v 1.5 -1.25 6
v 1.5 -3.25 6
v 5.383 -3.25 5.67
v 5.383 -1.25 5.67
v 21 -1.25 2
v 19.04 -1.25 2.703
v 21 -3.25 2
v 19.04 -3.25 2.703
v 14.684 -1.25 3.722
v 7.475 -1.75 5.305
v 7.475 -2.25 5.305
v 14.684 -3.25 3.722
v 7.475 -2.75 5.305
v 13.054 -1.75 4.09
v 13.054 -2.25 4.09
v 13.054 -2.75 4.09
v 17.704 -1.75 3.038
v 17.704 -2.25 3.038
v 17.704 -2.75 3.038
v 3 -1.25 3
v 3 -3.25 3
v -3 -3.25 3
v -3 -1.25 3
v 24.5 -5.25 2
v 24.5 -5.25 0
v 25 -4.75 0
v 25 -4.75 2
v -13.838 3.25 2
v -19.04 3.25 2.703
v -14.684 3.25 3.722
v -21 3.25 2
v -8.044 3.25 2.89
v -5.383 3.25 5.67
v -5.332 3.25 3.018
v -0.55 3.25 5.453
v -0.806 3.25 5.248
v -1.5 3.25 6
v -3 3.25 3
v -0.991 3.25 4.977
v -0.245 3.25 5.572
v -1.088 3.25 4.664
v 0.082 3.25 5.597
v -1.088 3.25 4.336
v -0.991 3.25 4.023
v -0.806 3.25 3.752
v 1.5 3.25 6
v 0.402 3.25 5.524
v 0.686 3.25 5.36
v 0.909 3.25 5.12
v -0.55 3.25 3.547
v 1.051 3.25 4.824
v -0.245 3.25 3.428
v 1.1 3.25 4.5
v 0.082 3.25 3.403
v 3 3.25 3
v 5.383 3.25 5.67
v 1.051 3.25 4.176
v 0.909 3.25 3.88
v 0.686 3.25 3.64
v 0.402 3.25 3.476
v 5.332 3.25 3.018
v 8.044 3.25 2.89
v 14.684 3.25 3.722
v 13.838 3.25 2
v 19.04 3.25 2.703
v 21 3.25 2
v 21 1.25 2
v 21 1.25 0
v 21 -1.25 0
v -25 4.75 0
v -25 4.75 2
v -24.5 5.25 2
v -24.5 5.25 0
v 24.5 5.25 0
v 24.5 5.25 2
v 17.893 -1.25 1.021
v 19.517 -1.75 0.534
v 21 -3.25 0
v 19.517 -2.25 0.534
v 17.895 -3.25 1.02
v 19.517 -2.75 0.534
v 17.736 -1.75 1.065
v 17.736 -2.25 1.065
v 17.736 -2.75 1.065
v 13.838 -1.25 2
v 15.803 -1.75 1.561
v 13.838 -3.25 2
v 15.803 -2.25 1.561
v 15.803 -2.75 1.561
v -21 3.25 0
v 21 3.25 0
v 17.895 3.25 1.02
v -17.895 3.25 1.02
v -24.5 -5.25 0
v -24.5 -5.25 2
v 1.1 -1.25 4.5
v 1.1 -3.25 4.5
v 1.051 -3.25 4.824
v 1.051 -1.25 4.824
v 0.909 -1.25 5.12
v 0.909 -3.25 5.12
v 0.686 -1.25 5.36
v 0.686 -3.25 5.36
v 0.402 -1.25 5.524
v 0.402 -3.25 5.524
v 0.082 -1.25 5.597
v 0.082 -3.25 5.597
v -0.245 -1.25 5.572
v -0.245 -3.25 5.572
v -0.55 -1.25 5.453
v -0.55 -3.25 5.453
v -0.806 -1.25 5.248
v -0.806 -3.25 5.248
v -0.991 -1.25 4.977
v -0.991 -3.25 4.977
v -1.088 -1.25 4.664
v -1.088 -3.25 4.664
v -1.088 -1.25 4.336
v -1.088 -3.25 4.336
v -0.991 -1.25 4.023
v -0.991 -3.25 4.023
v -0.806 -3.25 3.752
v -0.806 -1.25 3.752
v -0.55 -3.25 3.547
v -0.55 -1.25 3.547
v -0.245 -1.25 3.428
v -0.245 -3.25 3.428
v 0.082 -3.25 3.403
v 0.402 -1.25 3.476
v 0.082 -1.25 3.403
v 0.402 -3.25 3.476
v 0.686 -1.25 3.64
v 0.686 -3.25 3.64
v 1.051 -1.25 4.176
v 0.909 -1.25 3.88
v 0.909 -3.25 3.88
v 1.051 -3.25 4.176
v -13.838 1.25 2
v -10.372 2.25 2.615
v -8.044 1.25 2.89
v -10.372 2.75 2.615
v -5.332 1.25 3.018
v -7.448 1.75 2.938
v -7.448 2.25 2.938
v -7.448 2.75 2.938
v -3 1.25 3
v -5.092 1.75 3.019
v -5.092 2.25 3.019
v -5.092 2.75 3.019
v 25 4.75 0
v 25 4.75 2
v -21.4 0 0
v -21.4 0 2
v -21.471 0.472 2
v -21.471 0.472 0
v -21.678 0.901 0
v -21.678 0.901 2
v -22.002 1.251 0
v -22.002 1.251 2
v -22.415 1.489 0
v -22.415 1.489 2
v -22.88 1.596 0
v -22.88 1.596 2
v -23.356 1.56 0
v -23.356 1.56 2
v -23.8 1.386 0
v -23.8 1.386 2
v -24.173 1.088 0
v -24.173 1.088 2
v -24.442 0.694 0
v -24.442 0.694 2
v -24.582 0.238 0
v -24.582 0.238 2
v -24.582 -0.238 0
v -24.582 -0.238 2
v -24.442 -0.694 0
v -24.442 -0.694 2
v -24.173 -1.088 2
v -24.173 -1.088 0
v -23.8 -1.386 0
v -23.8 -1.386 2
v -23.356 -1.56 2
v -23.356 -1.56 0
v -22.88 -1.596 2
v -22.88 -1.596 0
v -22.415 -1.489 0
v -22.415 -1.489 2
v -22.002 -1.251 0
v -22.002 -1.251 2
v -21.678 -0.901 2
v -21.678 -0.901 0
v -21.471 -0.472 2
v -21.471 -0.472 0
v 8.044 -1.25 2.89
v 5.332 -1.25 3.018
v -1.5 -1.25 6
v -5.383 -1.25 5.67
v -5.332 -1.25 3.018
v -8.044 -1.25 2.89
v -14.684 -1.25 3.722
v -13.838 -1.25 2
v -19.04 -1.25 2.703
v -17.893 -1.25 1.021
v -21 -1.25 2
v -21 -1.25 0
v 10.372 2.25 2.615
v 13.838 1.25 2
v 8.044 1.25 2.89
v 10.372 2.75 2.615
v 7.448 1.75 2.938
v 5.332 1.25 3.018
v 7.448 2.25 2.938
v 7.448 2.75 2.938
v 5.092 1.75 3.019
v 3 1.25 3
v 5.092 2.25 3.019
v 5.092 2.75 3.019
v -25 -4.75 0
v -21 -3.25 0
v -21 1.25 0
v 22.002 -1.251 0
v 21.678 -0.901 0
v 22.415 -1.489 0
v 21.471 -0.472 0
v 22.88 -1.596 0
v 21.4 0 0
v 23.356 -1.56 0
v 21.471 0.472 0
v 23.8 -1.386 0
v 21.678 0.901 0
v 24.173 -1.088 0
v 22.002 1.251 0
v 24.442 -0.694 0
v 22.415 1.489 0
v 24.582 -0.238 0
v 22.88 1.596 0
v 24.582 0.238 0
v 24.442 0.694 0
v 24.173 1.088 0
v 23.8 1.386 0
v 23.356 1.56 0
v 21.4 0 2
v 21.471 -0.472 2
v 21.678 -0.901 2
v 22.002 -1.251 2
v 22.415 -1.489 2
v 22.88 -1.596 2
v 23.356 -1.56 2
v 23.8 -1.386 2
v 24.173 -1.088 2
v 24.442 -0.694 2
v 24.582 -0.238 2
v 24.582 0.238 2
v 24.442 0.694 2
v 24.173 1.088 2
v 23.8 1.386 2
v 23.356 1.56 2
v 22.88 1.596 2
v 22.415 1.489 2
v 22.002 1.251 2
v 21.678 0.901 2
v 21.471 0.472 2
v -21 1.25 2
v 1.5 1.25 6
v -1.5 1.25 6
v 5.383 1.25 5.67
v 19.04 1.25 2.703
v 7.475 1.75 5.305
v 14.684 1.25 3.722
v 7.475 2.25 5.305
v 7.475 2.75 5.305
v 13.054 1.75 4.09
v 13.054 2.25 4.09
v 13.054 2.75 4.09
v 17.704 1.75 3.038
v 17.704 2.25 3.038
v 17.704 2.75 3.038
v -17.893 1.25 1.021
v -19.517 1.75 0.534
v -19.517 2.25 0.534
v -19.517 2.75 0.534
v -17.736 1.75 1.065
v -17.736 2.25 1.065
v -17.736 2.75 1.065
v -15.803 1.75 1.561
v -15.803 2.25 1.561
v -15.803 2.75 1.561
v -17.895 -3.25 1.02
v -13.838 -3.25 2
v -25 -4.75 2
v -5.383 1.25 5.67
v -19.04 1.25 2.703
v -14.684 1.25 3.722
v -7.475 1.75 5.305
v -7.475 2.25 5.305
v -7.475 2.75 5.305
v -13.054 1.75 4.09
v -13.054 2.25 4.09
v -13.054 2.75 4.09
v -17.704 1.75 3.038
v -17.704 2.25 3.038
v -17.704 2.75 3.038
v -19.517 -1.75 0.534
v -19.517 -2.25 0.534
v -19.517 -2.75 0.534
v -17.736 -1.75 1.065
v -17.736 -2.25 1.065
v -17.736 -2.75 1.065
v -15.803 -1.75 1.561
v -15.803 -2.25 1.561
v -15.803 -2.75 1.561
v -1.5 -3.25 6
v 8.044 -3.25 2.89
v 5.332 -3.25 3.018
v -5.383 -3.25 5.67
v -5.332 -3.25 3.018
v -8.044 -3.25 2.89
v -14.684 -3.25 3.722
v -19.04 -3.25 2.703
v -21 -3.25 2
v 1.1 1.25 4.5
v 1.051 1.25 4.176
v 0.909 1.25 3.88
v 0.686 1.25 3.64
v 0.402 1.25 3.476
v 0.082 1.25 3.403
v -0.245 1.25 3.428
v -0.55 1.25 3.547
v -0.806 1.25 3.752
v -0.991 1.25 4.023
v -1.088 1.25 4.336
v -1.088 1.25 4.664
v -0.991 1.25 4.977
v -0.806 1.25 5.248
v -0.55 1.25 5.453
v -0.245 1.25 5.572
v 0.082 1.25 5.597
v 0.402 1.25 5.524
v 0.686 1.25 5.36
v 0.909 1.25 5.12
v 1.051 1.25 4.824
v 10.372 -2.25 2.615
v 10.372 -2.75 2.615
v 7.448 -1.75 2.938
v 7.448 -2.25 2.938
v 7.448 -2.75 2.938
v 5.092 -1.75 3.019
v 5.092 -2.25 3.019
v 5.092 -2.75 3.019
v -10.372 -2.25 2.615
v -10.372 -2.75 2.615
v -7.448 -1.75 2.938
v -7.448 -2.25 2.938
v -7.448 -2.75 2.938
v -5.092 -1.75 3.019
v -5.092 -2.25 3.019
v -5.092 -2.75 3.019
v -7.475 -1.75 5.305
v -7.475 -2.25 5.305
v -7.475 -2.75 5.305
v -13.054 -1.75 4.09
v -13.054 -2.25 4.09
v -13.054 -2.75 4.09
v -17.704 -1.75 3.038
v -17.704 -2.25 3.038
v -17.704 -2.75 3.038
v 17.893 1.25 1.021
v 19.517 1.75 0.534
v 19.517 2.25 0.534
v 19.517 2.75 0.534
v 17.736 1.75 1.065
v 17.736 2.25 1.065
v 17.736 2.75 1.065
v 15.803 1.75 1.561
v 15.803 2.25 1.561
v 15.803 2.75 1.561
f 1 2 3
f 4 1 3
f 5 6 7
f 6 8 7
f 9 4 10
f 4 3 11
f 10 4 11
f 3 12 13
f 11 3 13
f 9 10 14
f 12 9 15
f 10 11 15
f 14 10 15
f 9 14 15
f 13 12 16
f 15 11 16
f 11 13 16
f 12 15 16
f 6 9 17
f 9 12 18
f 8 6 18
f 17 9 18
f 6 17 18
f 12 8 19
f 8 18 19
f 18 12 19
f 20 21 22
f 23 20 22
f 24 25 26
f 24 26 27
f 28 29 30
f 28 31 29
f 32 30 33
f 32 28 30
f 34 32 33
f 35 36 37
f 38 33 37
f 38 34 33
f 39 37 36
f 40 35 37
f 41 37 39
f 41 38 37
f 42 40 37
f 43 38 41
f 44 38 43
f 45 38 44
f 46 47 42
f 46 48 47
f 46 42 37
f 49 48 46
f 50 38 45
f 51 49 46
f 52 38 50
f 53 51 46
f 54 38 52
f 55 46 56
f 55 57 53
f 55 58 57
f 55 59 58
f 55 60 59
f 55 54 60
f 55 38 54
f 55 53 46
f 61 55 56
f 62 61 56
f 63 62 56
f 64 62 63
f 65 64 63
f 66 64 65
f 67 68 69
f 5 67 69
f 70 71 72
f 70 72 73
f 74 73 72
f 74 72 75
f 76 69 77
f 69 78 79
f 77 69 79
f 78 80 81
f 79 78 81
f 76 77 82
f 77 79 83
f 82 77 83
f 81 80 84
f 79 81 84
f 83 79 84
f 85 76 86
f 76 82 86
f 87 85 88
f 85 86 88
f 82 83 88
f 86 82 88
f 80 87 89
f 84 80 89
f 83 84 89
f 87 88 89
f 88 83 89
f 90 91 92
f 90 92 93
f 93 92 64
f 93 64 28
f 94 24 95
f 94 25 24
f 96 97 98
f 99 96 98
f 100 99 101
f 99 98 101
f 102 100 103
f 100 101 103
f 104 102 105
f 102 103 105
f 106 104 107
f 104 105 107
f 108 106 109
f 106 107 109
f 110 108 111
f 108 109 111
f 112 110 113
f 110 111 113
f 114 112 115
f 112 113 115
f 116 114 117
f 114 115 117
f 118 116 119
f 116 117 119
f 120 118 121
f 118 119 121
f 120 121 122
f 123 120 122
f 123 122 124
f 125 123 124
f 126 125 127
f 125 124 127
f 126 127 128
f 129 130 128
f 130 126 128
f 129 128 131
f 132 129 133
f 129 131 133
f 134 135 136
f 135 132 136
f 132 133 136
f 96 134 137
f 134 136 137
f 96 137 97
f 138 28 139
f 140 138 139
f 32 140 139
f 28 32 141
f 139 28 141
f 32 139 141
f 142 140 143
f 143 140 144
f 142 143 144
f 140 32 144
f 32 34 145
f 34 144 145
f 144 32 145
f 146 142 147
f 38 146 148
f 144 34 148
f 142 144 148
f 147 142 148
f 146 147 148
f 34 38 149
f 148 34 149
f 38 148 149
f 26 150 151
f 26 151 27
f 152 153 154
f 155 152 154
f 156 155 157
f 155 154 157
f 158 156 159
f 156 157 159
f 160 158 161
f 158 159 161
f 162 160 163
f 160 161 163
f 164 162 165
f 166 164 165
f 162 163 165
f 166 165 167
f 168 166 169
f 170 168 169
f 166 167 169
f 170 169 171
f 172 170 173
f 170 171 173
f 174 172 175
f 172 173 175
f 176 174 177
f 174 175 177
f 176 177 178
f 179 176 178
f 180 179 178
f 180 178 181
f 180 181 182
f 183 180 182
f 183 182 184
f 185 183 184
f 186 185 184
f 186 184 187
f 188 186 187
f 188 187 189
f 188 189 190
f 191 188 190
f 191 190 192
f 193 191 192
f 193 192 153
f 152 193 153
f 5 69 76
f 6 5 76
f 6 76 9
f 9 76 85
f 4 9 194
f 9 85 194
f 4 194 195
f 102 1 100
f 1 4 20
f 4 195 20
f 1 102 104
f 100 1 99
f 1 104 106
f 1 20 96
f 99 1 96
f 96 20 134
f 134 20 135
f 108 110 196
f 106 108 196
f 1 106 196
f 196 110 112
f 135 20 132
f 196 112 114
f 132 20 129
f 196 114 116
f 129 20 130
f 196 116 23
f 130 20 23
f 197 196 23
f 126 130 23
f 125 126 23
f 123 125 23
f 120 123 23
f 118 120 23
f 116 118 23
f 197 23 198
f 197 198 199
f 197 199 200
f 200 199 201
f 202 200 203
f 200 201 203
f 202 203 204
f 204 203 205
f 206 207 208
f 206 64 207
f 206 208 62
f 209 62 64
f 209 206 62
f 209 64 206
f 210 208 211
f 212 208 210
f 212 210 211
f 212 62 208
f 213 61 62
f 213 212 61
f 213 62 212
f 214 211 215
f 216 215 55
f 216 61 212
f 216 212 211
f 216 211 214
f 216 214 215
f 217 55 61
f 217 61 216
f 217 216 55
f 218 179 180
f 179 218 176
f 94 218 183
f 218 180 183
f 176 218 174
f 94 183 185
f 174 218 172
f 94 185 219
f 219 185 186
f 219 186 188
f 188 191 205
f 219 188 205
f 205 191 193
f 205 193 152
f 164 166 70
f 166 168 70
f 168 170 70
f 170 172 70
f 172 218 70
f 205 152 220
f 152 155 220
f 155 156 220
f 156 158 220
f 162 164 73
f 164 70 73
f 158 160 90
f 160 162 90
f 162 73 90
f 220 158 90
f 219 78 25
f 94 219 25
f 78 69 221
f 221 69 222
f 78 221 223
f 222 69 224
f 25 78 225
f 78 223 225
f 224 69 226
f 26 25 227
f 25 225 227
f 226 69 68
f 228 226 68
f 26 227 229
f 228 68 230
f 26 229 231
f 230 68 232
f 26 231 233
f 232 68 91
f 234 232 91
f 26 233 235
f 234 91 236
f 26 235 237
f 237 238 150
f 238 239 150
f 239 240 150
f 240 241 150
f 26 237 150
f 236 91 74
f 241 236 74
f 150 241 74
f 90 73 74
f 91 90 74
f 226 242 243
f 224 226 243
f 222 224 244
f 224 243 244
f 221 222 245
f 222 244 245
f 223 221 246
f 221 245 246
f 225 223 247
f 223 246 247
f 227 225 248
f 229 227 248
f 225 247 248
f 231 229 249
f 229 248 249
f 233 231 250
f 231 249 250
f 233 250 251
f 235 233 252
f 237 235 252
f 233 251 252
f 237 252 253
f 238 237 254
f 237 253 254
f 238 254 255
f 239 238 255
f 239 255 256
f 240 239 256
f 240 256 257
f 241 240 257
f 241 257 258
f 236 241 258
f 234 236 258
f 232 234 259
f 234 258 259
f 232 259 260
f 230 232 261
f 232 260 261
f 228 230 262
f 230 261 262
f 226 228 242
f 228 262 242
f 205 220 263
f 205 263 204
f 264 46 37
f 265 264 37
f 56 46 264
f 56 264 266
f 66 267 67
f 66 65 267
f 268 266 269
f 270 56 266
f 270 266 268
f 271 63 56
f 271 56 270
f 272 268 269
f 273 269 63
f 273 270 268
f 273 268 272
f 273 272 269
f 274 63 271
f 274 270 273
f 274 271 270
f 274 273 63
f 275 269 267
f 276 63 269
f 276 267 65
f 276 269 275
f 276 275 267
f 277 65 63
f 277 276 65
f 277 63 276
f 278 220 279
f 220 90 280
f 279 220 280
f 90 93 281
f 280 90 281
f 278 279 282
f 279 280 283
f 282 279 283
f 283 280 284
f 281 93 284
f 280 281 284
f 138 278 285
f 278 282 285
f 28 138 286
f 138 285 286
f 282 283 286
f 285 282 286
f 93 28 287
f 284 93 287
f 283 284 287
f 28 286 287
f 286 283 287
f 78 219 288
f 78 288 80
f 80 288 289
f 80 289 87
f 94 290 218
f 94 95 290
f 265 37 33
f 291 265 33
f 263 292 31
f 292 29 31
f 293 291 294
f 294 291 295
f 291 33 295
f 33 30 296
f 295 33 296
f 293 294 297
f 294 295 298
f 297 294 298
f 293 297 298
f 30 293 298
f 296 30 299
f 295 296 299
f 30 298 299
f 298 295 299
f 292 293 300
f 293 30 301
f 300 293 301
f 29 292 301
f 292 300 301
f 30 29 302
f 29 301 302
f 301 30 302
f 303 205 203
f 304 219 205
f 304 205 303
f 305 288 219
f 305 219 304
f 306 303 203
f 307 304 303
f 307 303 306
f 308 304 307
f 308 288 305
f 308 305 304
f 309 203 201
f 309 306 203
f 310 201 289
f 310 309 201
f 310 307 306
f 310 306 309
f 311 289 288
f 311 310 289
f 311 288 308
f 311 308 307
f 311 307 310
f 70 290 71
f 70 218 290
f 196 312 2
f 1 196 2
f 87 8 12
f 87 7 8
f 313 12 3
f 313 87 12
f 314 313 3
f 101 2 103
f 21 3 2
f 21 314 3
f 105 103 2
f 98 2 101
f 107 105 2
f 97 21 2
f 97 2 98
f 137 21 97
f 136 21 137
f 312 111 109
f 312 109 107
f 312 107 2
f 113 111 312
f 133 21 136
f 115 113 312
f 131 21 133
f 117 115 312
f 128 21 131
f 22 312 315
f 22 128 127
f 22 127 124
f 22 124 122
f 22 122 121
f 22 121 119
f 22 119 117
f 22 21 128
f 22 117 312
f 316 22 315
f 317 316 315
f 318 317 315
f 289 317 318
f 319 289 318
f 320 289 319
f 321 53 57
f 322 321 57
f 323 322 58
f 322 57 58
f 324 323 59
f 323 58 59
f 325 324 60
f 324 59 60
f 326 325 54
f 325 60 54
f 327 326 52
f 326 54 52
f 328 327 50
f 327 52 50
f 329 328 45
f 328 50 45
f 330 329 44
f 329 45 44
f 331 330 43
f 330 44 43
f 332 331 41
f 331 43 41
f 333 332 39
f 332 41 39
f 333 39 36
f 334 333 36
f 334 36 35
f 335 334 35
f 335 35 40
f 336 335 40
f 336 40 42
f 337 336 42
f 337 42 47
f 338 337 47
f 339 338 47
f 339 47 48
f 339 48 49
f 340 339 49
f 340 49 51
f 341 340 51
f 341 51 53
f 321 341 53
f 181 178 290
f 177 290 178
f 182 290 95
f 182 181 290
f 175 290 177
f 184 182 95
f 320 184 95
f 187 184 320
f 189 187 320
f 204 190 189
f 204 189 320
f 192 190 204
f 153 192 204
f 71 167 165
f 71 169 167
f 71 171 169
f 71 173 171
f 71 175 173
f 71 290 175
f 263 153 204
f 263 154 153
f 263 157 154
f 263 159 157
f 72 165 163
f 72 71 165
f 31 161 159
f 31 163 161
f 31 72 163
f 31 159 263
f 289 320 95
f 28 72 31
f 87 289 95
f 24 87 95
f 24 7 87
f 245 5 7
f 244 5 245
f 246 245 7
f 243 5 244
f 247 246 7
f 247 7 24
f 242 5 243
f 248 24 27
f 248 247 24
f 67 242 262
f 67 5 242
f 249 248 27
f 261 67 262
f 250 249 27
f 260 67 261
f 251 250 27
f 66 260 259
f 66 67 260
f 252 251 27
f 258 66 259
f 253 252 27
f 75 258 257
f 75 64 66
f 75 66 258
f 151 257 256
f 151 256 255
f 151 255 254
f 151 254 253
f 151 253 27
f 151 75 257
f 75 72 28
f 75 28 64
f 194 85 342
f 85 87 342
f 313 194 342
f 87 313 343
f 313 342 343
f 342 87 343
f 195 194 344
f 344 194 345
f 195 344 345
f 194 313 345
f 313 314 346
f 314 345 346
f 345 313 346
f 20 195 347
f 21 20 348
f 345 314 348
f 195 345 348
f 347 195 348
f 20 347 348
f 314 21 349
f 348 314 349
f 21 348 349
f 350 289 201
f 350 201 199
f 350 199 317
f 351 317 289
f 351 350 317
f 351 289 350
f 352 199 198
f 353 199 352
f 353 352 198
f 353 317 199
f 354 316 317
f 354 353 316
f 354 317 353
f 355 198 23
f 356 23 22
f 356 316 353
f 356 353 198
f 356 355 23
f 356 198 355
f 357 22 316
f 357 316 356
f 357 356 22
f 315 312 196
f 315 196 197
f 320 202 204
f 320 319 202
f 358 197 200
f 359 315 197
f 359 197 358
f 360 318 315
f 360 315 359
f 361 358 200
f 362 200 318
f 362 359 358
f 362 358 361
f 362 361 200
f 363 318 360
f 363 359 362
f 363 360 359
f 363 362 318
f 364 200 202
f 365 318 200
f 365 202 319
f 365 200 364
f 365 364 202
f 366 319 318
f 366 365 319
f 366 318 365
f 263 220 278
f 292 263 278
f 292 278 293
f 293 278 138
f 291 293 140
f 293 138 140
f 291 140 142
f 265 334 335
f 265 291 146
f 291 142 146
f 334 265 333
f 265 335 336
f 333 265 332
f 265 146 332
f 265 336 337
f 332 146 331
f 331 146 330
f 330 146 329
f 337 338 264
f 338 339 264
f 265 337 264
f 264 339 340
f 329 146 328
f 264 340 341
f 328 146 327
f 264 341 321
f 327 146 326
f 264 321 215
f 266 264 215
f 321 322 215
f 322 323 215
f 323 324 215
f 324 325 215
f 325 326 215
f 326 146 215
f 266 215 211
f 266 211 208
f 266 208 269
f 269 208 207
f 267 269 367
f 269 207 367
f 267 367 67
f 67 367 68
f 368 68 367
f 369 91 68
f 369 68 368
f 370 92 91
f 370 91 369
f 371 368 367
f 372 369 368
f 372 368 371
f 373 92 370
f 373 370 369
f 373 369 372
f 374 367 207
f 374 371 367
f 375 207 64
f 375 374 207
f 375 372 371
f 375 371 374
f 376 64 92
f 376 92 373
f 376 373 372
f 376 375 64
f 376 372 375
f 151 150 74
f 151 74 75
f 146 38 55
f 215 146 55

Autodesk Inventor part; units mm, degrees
ref_plane "YZ Plane" through (0, 0, 0) normal (1, 0, 0) x (0, 1, 0)
ref_plane "XZ Plane" through (0, 0, 0) normal (0, 1, 0) x (-1, 0, 0)
ref_plane "XY Plane" through (0, 0, 0) normal (0, 0, 1) x (1, 0, 0)
sketch "Эскиз1" plane through (0, 0, 0) normal (0, 0, 1) x (1, 0, 0)
  line L0 (-30, -12.5) -> (30, -12.5) construction
  line L1 (30, -12.5) -> (30, 12.5) construction
  line L2 (30, 12.5) -> (-30, 12.5) construction
  line L3 (-30, 12.5) -> (-30, -12.5) construction
  line L4 (-30, -12.5) -> (30, 12.5) construction
  line L5 (30, -12.5) -> (-30, 12.5) construction
  line L6 (-25, 5.25) -> (25, 5.25)
  line L7 (25, 5.25) -> (25, -5.25)
  line L8 (25, -5.25) -> (-25, -5.25)
  line L9 (-25, -5.25) -> (-25, 5.25)
  line L10 (-25, 5.25) -> (25, -5.25) construction
  line L11 (25, 5.25) -> (-25, -5.25) construction
  line L12 (21, 3.25) -> (-21, 3.25)
  line L13 (-21, -3.25) -> (21, -3.25)
  line L14 (21, 3.25) -> (21, -3.25)
  line L15 (-21, 3.25) -> (-21, -3.25)
  point P0 (0, 0)
  dimension "d0" = 60
  dimension "d1" = 25
  dimension "d2" = 50
  dimension "d3" = 10.5
  dimension "d4" = 2
  dimension "d15" = 4
  dimension "d16" = 4
  dimension "d27" = 2
extrude "Выдавливание1" add sketch "Эскиз1" along normal blind 2
sketch "Эскиз4" plane through (0, 0, 2) normal (0, 0, 1) x (1, 0, 0)
  circle A0 centre (-23, 0) radius 1.6
  line L0 (-21, -3.25) -> (-21, 3.25) projected
  point P0 (0, 0)
  dimension "d17" = 3.2
  dimension "d18" = 2
extrude "Выдавливание3" cut sketch "Эскиз4" against normal blind 3
mirror "Зеркальное отражение2" about plane through (0, 0, 0) normal (1, 0, 0) of "Выдавливание3"
chamfer "Фаска2" distance 0.5 angle 45 4 edges at (25, -5.25, 1) (-25, -5.25, 1) (-25, 5.25, 1) (25, 5.25, 1)
sketch "Эскиз2" plane through (-25, 5.25, 0) normal (0, 1, 0) x (1, 0, 0)
  spline S0 degree 4 poles (46, 0) (42.3251, -1.5041) (33.5066, -3.3836) (31.2881, -3) (28, -3) knots 0 0 0 0 0 1 1 1 1 1
  line L0 (25, 0) -> (25, -3) construction
  line L1 (25, -3) -> (28, -3)
  line L2 (26.5, -6) -> (23.5, -6)
  line L3 (25, -3) -> (25, -6)
  spline S1 degree 4 poles (26.5, -6) (32.4688, -6) (38.7503, -3.3818) (43.4963, -3.2883) (46, -2) knots 0 0 0 0 0 1 1 1 1 1
  circle A0 centre (25, -4.5) radius 1.1
  line L4 (46, 0) -> (46, -2)
  line L5 (50, -2) -> (0, -2) projected
  spline S2 degree 4 poles (4, 0) (7.6749, -1.5041) (16.4934, -3.3836) (18.7119, -3) (22, -3) knots 0 0 0 0 0 1 1 1 1 1
  line L6 (25, -3) -> (22, -3)
  line L7 (23.5, -6) -> (26.5, -6)
  spline S3 degree 4 poles (23.5, -6) (17.5312, -6) (11.2497, -3.3818) (6.5037, -3.2883) (4, -2) knots 0 0 0 0 0 1 1 1 1 1
  line L8 (4, 0) -> (4, -2)
  line L9 (50, 0) -> (0, 0) projected
  point P0 (37.5638, -2.2507)
  point P1 (31.2637, -3)
  point P2 (36.2453, -4.5)
  point P3 (42.8648, -3)
  point P4 (26.5, -3)
  point P5 (38.8382, -2)
  point P6 (12.4362, -2.2507)
  point P7 (18.7363, -3)
  point P8 (13.7547, -4.5)
  point P9 (7.1352, -3)
  point P10 (11.1618, -2)
  point P11 (4, -2)
  point P12 (23.5, -9)
  point P13 (4, -2)
  point P14 (45.3365, 0)
  point P15 (4, 0)
  point P16 (23.5, -3)
  point P17 (26.5, -6)
  dimension "d7" = 3
  dimension "d8" = 2.2
  dimension "d9" = 3
  dimension "d10" = 3
  dimension "d32" = 2
  dimension "d39" = 1
extrude "Выдавливание7" add sketch "Эскиз2" against normal blind 4 contours L4 L5 S0 | L5 S1 L2 L3 A0 L1 S0 | S2 L5 L8 | S2 L6 L3 A0 L2 S3 L5
extrude "Выдавливание8" cut sketch "Эскиз2" against normal blind 2 contours L5 S1 L2 L3 A0 L1 S0 | S2 L6 L3 A0 L2 S3 L5
mirror "Зеркальное отражение5" about plane through (0, 0, 0) normal (0, 1, 0) of "Выдавливание7", "Выдавливание8"
properties part number "мост"
